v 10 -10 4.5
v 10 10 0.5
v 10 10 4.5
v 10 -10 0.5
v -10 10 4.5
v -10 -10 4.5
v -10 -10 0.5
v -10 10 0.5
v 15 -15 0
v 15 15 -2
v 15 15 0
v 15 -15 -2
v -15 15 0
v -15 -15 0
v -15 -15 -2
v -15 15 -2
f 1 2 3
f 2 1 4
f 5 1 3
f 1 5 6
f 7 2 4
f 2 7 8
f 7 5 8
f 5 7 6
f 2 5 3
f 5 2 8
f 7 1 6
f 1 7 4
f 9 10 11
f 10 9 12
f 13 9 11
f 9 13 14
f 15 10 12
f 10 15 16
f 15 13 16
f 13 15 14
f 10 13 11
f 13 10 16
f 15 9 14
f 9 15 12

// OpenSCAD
outer = 30;
inner = 20;

connector(outer, inner);

module connector (o, i) {
    union() {
        translate([0, 0, 2.5])
        cube([i, i, 4], center=true);

        translate([0, 0, -1])
        cube([o, o, 2], center=true);
    }
}
